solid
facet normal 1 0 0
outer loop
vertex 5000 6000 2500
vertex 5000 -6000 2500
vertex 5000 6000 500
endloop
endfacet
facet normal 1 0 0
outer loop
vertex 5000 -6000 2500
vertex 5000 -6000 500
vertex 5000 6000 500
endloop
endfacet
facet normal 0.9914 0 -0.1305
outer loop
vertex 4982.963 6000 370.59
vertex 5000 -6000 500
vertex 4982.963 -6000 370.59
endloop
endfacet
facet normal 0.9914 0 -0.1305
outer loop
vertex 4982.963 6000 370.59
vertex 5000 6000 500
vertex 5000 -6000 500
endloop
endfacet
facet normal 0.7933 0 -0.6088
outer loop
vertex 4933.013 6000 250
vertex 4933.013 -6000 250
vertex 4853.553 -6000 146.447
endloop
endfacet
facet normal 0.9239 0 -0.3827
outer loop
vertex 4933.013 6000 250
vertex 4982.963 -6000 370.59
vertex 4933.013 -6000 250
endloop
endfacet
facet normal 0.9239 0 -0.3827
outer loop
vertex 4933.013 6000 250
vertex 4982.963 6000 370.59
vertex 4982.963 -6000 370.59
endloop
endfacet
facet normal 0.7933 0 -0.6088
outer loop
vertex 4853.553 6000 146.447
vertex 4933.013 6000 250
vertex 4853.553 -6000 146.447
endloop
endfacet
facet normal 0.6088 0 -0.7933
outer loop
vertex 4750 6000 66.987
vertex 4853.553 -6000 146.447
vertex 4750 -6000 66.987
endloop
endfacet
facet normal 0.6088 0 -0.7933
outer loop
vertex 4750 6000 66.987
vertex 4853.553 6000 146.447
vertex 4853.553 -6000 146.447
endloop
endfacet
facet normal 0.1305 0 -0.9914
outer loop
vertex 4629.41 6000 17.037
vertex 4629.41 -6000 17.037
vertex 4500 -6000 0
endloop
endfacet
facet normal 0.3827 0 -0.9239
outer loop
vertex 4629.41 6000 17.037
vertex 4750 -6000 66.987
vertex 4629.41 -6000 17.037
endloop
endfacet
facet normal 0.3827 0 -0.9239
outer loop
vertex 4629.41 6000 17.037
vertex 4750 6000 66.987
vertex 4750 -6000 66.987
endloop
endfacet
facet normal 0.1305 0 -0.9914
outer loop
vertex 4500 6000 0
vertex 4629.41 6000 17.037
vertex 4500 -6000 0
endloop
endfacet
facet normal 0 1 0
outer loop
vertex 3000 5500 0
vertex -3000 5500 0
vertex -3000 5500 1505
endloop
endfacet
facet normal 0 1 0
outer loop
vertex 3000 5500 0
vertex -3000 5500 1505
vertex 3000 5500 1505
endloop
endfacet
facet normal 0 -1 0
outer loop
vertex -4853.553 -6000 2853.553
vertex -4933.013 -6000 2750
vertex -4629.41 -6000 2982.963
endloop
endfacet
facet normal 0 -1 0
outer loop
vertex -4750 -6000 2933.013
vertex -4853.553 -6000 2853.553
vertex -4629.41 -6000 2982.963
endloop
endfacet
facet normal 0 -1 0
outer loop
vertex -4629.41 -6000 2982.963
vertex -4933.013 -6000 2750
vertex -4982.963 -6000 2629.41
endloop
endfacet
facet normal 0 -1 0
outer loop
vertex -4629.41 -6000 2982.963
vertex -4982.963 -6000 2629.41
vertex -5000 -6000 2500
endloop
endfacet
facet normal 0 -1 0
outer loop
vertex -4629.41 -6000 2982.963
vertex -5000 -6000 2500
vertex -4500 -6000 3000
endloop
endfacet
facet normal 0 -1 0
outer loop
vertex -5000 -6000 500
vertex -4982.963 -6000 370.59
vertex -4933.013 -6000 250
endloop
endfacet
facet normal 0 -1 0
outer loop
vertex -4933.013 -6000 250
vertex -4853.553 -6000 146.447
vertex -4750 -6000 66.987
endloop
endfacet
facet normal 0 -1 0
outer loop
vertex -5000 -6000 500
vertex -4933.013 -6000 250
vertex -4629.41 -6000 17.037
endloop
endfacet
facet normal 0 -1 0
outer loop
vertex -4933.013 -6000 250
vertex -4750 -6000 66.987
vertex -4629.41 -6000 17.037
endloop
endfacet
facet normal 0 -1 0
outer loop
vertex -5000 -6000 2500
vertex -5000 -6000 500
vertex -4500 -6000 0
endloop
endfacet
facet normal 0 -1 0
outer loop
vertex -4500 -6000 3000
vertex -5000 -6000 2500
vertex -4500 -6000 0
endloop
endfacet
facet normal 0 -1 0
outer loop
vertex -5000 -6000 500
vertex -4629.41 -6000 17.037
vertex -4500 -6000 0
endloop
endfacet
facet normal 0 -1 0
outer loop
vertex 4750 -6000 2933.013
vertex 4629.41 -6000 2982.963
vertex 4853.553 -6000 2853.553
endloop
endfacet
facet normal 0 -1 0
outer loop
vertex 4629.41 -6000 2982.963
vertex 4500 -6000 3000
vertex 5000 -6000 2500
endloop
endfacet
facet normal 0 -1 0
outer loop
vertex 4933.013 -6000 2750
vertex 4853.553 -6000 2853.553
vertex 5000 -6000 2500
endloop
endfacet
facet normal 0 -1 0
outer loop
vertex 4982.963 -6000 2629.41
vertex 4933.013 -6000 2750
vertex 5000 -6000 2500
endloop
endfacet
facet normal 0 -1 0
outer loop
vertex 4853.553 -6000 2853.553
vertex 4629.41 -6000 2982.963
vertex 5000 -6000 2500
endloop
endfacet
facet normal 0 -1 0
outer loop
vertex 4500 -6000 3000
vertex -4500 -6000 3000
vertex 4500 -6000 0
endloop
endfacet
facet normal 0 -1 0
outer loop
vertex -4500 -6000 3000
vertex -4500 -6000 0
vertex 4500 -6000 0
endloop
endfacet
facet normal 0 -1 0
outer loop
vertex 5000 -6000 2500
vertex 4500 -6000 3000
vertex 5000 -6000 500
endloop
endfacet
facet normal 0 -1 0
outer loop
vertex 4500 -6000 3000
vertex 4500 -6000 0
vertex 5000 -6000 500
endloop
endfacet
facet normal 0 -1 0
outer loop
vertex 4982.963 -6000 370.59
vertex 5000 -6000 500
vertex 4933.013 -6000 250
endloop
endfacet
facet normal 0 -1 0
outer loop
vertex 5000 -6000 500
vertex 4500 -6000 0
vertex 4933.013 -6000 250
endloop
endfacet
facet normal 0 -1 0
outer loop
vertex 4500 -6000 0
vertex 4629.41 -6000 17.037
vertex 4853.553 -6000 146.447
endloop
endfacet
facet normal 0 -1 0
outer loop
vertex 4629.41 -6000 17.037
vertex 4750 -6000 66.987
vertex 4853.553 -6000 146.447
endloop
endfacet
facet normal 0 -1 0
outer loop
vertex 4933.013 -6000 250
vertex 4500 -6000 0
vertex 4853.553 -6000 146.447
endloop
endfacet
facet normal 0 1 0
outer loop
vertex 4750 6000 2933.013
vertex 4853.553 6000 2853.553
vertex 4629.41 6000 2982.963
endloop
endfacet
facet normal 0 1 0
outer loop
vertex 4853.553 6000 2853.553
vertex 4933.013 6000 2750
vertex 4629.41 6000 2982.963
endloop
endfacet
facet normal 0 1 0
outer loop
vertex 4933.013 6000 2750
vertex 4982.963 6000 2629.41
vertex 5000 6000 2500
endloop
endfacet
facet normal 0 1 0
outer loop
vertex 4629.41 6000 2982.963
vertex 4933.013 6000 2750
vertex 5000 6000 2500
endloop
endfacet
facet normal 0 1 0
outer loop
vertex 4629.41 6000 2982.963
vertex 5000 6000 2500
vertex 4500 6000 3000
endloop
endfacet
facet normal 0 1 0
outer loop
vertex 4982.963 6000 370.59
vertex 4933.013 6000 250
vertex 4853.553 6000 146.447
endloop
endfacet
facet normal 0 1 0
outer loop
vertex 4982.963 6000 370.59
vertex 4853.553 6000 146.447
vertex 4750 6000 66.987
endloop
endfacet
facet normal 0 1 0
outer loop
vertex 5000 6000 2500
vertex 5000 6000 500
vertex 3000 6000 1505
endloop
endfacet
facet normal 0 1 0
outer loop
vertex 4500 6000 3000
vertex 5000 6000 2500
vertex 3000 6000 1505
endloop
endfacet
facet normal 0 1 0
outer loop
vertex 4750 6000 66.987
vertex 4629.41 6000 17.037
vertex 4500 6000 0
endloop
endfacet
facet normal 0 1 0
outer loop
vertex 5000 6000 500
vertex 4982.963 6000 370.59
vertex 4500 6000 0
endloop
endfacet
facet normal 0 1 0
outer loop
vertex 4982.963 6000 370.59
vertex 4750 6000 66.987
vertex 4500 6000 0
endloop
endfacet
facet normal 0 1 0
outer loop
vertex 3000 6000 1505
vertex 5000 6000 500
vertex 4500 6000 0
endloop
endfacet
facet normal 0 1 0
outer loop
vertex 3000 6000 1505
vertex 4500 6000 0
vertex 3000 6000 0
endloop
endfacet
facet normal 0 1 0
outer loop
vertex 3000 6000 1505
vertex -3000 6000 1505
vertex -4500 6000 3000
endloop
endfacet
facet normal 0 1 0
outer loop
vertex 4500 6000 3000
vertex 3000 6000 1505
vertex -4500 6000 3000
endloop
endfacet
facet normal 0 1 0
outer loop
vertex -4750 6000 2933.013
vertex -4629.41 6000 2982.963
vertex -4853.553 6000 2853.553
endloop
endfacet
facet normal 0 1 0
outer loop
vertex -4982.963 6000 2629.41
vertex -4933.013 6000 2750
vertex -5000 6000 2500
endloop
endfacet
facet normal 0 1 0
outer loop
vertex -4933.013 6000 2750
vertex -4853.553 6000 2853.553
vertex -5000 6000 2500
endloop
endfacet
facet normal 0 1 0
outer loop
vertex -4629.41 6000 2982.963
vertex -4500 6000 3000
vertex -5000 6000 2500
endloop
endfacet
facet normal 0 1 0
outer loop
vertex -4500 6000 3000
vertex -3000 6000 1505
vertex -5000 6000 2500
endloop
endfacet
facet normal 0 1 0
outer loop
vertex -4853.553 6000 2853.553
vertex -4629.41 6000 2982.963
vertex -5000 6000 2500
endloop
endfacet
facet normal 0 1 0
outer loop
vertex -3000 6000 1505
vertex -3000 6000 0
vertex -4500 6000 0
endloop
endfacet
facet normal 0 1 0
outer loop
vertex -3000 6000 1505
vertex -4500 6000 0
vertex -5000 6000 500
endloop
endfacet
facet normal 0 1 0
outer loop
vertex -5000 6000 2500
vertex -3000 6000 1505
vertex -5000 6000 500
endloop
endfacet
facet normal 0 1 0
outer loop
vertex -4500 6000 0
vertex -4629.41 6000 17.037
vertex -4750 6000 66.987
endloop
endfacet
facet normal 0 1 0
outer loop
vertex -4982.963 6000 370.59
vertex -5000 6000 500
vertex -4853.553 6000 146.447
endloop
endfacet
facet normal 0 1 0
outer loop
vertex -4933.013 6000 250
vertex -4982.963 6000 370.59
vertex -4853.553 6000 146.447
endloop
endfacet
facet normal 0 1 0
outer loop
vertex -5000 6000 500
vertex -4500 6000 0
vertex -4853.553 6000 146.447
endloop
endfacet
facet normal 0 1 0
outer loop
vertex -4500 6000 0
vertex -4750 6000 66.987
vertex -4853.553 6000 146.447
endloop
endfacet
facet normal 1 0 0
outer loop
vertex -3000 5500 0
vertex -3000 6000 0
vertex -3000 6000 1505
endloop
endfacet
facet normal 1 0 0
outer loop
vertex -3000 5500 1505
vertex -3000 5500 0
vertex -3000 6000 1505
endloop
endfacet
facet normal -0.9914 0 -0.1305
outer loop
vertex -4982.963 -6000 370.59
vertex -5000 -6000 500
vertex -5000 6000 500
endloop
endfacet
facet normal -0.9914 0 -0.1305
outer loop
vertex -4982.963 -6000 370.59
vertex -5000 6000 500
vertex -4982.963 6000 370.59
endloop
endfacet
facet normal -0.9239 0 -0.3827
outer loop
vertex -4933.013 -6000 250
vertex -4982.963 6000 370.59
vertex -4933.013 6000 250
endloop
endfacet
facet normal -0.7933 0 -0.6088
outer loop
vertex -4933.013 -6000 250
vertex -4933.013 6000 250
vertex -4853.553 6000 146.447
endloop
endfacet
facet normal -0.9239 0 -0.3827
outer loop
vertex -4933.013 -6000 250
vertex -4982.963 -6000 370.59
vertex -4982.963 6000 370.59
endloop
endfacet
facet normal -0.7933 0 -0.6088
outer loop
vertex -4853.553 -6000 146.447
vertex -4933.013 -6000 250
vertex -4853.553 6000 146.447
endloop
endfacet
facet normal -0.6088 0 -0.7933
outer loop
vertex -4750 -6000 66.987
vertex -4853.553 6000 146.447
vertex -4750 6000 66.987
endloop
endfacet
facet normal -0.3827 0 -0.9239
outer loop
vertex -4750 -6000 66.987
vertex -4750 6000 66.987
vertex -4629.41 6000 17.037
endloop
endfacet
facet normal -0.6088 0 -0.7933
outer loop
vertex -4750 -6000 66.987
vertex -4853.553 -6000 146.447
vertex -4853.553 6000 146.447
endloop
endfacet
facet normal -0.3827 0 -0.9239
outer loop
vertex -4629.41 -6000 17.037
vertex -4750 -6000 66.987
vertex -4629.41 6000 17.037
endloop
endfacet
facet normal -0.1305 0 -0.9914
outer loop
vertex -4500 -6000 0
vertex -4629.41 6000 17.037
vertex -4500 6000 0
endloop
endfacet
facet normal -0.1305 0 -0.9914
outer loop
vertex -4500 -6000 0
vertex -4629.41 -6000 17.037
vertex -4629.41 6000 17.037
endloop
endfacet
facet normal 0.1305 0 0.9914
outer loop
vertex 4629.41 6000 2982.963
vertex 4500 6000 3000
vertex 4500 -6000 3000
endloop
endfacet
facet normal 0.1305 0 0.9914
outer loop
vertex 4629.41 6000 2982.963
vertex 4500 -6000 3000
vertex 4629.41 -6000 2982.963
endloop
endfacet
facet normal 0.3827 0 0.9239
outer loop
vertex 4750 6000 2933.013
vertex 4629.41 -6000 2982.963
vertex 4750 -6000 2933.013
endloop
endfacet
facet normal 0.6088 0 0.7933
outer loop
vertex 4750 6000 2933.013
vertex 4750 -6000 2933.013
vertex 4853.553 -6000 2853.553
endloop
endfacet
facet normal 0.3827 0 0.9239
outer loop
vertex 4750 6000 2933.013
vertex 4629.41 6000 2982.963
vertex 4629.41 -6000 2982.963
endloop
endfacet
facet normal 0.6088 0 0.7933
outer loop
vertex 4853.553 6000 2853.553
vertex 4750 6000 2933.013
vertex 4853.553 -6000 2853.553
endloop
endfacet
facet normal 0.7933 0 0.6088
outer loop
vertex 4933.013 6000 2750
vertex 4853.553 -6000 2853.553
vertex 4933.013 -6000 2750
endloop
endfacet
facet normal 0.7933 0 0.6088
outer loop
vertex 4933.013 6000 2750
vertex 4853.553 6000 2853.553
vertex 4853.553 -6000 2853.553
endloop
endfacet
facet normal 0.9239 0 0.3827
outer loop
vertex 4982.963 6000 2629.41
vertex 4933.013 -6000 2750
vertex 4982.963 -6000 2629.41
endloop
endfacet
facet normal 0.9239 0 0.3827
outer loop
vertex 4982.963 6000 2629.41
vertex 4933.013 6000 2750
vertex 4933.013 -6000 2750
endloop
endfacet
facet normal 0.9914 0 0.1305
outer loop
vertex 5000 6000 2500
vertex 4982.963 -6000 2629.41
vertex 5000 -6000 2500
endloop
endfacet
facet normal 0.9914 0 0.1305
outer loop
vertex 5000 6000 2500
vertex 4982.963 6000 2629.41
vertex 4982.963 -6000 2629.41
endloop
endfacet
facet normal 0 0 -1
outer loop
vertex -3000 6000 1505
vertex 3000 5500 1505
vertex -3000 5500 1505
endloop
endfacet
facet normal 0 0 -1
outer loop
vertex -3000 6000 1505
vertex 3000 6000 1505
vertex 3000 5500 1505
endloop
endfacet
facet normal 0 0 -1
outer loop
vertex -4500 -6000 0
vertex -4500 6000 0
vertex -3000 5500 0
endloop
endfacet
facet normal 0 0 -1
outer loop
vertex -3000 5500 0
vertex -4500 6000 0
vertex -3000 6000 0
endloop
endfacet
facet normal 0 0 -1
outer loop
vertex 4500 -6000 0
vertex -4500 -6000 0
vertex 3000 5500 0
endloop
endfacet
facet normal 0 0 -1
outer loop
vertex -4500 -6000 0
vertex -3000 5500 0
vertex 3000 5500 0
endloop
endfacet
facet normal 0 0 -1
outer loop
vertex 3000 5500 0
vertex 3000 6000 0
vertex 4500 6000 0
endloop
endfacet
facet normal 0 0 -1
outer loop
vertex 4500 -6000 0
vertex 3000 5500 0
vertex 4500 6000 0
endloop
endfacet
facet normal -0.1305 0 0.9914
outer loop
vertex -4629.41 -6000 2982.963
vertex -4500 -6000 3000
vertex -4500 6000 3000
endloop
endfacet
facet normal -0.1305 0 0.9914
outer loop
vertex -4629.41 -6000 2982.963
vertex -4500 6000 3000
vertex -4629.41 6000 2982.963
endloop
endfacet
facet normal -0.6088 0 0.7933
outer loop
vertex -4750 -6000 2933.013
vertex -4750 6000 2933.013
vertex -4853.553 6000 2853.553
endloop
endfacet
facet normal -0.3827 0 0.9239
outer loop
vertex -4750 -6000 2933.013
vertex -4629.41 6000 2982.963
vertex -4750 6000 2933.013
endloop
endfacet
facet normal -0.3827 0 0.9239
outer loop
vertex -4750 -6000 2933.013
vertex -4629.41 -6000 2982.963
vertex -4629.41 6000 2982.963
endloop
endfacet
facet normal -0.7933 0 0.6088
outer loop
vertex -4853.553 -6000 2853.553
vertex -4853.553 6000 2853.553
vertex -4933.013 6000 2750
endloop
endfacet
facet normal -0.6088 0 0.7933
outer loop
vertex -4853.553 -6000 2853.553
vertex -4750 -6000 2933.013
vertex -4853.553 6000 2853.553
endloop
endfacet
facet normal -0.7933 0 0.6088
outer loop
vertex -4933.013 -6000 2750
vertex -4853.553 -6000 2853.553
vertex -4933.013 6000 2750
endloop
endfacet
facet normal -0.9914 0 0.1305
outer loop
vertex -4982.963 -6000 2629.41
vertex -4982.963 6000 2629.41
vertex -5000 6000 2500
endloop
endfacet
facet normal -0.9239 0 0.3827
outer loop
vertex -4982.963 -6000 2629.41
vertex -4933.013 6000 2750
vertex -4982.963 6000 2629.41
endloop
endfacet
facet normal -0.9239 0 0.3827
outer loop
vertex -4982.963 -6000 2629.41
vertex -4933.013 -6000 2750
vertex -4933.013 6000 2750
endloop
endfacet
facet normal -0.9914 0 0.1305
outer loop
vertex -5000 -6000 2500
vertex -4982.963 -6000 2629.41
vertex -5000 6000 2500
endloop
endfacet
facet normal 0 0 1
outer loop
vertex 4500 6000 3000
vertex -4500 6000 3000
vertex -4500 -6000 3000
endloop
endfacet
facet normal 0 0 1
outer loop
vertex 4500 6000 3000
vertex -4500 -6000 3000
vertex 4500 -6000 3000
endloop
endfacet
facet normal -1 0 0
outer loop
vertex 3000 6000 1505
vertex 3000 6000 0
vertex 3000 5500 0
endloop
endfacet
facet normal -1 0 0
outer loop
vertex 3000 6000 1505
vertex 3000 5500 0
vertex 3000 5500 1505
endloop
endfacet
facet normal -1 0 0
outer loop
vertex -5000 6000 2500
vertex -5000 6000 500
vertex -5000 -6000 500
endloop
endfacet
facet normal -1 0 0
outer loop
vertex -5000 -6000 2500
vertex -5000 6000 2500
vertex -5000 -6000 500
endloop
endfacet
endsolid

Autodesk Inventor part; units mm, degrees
ref_plane "YZ Plane" through (0, 0, 0) normal (1, 0, 0) x (0, 1, 0)
ref_plane "XZ Plane" through (0, 0, 0) normal (0, 1, 0) x (-1, 0, 0)
ref_plane "XY Plane" through (0, 0, 0) normal (0, 0, 1) x (1, 0, 0)
sketch "Skizze1" plane through (0, 0, 0) normal (0, 0, 1) x (1, 0, 0)
  line L0 (-7000, 0) -> (7000, 0) construction
  line L1 (0, -8400) -> (0, 8400) construction
  line L2 (-5000, -6000) -> (5000, -6000)
  line L3 (5000, -6000) -> (5000, 6000)
  line L4 (5000, 6000) -> (-5000, 6000)
  line L5 (-5000, 6000) -> (-5000, -6000)
  line L6 (-5000, -6000) -> (5000, 6000) construction
  line L7 (5000, -6000) -> (-5000, 6000) construction
  point P0 (0, 0)
  dimension "d0" = 10000
  dimension "d1" = 12000
extrude "Extrusion1" add sketch "Skizze1" along normal blind 3000
sketch "Skizze2" plane through (-5000, 6000, 0) normal (0, 1, 0) x (1, 0, 0)
  line L0 (5000, 0) -> (2000, 0)
  line L1 (2000, 0) -> (2000, -1505)
  line L2 (2000, -1505) -> (5000, -1505)
  line L3 (5000, 0) -> (8000, 0)
  line L4 (8000, 0) -> (8000, -1505)
  line L5 (8000, -1505) -> (5000, -1505)
  dimension "d4" = 3000
  dimension "d5" = 1505
  dimension "d6" = 3000
extrude "Extrusion2" cut sketch "Skizze2" against normal blind 500
fillet "Rundung1" radius 500 4 edges at (5000, 0, 0) (5000, 0, 3000) (-5000, 0, 0) (-5000, 0, 3000)
properties part number "2 Stütze"
